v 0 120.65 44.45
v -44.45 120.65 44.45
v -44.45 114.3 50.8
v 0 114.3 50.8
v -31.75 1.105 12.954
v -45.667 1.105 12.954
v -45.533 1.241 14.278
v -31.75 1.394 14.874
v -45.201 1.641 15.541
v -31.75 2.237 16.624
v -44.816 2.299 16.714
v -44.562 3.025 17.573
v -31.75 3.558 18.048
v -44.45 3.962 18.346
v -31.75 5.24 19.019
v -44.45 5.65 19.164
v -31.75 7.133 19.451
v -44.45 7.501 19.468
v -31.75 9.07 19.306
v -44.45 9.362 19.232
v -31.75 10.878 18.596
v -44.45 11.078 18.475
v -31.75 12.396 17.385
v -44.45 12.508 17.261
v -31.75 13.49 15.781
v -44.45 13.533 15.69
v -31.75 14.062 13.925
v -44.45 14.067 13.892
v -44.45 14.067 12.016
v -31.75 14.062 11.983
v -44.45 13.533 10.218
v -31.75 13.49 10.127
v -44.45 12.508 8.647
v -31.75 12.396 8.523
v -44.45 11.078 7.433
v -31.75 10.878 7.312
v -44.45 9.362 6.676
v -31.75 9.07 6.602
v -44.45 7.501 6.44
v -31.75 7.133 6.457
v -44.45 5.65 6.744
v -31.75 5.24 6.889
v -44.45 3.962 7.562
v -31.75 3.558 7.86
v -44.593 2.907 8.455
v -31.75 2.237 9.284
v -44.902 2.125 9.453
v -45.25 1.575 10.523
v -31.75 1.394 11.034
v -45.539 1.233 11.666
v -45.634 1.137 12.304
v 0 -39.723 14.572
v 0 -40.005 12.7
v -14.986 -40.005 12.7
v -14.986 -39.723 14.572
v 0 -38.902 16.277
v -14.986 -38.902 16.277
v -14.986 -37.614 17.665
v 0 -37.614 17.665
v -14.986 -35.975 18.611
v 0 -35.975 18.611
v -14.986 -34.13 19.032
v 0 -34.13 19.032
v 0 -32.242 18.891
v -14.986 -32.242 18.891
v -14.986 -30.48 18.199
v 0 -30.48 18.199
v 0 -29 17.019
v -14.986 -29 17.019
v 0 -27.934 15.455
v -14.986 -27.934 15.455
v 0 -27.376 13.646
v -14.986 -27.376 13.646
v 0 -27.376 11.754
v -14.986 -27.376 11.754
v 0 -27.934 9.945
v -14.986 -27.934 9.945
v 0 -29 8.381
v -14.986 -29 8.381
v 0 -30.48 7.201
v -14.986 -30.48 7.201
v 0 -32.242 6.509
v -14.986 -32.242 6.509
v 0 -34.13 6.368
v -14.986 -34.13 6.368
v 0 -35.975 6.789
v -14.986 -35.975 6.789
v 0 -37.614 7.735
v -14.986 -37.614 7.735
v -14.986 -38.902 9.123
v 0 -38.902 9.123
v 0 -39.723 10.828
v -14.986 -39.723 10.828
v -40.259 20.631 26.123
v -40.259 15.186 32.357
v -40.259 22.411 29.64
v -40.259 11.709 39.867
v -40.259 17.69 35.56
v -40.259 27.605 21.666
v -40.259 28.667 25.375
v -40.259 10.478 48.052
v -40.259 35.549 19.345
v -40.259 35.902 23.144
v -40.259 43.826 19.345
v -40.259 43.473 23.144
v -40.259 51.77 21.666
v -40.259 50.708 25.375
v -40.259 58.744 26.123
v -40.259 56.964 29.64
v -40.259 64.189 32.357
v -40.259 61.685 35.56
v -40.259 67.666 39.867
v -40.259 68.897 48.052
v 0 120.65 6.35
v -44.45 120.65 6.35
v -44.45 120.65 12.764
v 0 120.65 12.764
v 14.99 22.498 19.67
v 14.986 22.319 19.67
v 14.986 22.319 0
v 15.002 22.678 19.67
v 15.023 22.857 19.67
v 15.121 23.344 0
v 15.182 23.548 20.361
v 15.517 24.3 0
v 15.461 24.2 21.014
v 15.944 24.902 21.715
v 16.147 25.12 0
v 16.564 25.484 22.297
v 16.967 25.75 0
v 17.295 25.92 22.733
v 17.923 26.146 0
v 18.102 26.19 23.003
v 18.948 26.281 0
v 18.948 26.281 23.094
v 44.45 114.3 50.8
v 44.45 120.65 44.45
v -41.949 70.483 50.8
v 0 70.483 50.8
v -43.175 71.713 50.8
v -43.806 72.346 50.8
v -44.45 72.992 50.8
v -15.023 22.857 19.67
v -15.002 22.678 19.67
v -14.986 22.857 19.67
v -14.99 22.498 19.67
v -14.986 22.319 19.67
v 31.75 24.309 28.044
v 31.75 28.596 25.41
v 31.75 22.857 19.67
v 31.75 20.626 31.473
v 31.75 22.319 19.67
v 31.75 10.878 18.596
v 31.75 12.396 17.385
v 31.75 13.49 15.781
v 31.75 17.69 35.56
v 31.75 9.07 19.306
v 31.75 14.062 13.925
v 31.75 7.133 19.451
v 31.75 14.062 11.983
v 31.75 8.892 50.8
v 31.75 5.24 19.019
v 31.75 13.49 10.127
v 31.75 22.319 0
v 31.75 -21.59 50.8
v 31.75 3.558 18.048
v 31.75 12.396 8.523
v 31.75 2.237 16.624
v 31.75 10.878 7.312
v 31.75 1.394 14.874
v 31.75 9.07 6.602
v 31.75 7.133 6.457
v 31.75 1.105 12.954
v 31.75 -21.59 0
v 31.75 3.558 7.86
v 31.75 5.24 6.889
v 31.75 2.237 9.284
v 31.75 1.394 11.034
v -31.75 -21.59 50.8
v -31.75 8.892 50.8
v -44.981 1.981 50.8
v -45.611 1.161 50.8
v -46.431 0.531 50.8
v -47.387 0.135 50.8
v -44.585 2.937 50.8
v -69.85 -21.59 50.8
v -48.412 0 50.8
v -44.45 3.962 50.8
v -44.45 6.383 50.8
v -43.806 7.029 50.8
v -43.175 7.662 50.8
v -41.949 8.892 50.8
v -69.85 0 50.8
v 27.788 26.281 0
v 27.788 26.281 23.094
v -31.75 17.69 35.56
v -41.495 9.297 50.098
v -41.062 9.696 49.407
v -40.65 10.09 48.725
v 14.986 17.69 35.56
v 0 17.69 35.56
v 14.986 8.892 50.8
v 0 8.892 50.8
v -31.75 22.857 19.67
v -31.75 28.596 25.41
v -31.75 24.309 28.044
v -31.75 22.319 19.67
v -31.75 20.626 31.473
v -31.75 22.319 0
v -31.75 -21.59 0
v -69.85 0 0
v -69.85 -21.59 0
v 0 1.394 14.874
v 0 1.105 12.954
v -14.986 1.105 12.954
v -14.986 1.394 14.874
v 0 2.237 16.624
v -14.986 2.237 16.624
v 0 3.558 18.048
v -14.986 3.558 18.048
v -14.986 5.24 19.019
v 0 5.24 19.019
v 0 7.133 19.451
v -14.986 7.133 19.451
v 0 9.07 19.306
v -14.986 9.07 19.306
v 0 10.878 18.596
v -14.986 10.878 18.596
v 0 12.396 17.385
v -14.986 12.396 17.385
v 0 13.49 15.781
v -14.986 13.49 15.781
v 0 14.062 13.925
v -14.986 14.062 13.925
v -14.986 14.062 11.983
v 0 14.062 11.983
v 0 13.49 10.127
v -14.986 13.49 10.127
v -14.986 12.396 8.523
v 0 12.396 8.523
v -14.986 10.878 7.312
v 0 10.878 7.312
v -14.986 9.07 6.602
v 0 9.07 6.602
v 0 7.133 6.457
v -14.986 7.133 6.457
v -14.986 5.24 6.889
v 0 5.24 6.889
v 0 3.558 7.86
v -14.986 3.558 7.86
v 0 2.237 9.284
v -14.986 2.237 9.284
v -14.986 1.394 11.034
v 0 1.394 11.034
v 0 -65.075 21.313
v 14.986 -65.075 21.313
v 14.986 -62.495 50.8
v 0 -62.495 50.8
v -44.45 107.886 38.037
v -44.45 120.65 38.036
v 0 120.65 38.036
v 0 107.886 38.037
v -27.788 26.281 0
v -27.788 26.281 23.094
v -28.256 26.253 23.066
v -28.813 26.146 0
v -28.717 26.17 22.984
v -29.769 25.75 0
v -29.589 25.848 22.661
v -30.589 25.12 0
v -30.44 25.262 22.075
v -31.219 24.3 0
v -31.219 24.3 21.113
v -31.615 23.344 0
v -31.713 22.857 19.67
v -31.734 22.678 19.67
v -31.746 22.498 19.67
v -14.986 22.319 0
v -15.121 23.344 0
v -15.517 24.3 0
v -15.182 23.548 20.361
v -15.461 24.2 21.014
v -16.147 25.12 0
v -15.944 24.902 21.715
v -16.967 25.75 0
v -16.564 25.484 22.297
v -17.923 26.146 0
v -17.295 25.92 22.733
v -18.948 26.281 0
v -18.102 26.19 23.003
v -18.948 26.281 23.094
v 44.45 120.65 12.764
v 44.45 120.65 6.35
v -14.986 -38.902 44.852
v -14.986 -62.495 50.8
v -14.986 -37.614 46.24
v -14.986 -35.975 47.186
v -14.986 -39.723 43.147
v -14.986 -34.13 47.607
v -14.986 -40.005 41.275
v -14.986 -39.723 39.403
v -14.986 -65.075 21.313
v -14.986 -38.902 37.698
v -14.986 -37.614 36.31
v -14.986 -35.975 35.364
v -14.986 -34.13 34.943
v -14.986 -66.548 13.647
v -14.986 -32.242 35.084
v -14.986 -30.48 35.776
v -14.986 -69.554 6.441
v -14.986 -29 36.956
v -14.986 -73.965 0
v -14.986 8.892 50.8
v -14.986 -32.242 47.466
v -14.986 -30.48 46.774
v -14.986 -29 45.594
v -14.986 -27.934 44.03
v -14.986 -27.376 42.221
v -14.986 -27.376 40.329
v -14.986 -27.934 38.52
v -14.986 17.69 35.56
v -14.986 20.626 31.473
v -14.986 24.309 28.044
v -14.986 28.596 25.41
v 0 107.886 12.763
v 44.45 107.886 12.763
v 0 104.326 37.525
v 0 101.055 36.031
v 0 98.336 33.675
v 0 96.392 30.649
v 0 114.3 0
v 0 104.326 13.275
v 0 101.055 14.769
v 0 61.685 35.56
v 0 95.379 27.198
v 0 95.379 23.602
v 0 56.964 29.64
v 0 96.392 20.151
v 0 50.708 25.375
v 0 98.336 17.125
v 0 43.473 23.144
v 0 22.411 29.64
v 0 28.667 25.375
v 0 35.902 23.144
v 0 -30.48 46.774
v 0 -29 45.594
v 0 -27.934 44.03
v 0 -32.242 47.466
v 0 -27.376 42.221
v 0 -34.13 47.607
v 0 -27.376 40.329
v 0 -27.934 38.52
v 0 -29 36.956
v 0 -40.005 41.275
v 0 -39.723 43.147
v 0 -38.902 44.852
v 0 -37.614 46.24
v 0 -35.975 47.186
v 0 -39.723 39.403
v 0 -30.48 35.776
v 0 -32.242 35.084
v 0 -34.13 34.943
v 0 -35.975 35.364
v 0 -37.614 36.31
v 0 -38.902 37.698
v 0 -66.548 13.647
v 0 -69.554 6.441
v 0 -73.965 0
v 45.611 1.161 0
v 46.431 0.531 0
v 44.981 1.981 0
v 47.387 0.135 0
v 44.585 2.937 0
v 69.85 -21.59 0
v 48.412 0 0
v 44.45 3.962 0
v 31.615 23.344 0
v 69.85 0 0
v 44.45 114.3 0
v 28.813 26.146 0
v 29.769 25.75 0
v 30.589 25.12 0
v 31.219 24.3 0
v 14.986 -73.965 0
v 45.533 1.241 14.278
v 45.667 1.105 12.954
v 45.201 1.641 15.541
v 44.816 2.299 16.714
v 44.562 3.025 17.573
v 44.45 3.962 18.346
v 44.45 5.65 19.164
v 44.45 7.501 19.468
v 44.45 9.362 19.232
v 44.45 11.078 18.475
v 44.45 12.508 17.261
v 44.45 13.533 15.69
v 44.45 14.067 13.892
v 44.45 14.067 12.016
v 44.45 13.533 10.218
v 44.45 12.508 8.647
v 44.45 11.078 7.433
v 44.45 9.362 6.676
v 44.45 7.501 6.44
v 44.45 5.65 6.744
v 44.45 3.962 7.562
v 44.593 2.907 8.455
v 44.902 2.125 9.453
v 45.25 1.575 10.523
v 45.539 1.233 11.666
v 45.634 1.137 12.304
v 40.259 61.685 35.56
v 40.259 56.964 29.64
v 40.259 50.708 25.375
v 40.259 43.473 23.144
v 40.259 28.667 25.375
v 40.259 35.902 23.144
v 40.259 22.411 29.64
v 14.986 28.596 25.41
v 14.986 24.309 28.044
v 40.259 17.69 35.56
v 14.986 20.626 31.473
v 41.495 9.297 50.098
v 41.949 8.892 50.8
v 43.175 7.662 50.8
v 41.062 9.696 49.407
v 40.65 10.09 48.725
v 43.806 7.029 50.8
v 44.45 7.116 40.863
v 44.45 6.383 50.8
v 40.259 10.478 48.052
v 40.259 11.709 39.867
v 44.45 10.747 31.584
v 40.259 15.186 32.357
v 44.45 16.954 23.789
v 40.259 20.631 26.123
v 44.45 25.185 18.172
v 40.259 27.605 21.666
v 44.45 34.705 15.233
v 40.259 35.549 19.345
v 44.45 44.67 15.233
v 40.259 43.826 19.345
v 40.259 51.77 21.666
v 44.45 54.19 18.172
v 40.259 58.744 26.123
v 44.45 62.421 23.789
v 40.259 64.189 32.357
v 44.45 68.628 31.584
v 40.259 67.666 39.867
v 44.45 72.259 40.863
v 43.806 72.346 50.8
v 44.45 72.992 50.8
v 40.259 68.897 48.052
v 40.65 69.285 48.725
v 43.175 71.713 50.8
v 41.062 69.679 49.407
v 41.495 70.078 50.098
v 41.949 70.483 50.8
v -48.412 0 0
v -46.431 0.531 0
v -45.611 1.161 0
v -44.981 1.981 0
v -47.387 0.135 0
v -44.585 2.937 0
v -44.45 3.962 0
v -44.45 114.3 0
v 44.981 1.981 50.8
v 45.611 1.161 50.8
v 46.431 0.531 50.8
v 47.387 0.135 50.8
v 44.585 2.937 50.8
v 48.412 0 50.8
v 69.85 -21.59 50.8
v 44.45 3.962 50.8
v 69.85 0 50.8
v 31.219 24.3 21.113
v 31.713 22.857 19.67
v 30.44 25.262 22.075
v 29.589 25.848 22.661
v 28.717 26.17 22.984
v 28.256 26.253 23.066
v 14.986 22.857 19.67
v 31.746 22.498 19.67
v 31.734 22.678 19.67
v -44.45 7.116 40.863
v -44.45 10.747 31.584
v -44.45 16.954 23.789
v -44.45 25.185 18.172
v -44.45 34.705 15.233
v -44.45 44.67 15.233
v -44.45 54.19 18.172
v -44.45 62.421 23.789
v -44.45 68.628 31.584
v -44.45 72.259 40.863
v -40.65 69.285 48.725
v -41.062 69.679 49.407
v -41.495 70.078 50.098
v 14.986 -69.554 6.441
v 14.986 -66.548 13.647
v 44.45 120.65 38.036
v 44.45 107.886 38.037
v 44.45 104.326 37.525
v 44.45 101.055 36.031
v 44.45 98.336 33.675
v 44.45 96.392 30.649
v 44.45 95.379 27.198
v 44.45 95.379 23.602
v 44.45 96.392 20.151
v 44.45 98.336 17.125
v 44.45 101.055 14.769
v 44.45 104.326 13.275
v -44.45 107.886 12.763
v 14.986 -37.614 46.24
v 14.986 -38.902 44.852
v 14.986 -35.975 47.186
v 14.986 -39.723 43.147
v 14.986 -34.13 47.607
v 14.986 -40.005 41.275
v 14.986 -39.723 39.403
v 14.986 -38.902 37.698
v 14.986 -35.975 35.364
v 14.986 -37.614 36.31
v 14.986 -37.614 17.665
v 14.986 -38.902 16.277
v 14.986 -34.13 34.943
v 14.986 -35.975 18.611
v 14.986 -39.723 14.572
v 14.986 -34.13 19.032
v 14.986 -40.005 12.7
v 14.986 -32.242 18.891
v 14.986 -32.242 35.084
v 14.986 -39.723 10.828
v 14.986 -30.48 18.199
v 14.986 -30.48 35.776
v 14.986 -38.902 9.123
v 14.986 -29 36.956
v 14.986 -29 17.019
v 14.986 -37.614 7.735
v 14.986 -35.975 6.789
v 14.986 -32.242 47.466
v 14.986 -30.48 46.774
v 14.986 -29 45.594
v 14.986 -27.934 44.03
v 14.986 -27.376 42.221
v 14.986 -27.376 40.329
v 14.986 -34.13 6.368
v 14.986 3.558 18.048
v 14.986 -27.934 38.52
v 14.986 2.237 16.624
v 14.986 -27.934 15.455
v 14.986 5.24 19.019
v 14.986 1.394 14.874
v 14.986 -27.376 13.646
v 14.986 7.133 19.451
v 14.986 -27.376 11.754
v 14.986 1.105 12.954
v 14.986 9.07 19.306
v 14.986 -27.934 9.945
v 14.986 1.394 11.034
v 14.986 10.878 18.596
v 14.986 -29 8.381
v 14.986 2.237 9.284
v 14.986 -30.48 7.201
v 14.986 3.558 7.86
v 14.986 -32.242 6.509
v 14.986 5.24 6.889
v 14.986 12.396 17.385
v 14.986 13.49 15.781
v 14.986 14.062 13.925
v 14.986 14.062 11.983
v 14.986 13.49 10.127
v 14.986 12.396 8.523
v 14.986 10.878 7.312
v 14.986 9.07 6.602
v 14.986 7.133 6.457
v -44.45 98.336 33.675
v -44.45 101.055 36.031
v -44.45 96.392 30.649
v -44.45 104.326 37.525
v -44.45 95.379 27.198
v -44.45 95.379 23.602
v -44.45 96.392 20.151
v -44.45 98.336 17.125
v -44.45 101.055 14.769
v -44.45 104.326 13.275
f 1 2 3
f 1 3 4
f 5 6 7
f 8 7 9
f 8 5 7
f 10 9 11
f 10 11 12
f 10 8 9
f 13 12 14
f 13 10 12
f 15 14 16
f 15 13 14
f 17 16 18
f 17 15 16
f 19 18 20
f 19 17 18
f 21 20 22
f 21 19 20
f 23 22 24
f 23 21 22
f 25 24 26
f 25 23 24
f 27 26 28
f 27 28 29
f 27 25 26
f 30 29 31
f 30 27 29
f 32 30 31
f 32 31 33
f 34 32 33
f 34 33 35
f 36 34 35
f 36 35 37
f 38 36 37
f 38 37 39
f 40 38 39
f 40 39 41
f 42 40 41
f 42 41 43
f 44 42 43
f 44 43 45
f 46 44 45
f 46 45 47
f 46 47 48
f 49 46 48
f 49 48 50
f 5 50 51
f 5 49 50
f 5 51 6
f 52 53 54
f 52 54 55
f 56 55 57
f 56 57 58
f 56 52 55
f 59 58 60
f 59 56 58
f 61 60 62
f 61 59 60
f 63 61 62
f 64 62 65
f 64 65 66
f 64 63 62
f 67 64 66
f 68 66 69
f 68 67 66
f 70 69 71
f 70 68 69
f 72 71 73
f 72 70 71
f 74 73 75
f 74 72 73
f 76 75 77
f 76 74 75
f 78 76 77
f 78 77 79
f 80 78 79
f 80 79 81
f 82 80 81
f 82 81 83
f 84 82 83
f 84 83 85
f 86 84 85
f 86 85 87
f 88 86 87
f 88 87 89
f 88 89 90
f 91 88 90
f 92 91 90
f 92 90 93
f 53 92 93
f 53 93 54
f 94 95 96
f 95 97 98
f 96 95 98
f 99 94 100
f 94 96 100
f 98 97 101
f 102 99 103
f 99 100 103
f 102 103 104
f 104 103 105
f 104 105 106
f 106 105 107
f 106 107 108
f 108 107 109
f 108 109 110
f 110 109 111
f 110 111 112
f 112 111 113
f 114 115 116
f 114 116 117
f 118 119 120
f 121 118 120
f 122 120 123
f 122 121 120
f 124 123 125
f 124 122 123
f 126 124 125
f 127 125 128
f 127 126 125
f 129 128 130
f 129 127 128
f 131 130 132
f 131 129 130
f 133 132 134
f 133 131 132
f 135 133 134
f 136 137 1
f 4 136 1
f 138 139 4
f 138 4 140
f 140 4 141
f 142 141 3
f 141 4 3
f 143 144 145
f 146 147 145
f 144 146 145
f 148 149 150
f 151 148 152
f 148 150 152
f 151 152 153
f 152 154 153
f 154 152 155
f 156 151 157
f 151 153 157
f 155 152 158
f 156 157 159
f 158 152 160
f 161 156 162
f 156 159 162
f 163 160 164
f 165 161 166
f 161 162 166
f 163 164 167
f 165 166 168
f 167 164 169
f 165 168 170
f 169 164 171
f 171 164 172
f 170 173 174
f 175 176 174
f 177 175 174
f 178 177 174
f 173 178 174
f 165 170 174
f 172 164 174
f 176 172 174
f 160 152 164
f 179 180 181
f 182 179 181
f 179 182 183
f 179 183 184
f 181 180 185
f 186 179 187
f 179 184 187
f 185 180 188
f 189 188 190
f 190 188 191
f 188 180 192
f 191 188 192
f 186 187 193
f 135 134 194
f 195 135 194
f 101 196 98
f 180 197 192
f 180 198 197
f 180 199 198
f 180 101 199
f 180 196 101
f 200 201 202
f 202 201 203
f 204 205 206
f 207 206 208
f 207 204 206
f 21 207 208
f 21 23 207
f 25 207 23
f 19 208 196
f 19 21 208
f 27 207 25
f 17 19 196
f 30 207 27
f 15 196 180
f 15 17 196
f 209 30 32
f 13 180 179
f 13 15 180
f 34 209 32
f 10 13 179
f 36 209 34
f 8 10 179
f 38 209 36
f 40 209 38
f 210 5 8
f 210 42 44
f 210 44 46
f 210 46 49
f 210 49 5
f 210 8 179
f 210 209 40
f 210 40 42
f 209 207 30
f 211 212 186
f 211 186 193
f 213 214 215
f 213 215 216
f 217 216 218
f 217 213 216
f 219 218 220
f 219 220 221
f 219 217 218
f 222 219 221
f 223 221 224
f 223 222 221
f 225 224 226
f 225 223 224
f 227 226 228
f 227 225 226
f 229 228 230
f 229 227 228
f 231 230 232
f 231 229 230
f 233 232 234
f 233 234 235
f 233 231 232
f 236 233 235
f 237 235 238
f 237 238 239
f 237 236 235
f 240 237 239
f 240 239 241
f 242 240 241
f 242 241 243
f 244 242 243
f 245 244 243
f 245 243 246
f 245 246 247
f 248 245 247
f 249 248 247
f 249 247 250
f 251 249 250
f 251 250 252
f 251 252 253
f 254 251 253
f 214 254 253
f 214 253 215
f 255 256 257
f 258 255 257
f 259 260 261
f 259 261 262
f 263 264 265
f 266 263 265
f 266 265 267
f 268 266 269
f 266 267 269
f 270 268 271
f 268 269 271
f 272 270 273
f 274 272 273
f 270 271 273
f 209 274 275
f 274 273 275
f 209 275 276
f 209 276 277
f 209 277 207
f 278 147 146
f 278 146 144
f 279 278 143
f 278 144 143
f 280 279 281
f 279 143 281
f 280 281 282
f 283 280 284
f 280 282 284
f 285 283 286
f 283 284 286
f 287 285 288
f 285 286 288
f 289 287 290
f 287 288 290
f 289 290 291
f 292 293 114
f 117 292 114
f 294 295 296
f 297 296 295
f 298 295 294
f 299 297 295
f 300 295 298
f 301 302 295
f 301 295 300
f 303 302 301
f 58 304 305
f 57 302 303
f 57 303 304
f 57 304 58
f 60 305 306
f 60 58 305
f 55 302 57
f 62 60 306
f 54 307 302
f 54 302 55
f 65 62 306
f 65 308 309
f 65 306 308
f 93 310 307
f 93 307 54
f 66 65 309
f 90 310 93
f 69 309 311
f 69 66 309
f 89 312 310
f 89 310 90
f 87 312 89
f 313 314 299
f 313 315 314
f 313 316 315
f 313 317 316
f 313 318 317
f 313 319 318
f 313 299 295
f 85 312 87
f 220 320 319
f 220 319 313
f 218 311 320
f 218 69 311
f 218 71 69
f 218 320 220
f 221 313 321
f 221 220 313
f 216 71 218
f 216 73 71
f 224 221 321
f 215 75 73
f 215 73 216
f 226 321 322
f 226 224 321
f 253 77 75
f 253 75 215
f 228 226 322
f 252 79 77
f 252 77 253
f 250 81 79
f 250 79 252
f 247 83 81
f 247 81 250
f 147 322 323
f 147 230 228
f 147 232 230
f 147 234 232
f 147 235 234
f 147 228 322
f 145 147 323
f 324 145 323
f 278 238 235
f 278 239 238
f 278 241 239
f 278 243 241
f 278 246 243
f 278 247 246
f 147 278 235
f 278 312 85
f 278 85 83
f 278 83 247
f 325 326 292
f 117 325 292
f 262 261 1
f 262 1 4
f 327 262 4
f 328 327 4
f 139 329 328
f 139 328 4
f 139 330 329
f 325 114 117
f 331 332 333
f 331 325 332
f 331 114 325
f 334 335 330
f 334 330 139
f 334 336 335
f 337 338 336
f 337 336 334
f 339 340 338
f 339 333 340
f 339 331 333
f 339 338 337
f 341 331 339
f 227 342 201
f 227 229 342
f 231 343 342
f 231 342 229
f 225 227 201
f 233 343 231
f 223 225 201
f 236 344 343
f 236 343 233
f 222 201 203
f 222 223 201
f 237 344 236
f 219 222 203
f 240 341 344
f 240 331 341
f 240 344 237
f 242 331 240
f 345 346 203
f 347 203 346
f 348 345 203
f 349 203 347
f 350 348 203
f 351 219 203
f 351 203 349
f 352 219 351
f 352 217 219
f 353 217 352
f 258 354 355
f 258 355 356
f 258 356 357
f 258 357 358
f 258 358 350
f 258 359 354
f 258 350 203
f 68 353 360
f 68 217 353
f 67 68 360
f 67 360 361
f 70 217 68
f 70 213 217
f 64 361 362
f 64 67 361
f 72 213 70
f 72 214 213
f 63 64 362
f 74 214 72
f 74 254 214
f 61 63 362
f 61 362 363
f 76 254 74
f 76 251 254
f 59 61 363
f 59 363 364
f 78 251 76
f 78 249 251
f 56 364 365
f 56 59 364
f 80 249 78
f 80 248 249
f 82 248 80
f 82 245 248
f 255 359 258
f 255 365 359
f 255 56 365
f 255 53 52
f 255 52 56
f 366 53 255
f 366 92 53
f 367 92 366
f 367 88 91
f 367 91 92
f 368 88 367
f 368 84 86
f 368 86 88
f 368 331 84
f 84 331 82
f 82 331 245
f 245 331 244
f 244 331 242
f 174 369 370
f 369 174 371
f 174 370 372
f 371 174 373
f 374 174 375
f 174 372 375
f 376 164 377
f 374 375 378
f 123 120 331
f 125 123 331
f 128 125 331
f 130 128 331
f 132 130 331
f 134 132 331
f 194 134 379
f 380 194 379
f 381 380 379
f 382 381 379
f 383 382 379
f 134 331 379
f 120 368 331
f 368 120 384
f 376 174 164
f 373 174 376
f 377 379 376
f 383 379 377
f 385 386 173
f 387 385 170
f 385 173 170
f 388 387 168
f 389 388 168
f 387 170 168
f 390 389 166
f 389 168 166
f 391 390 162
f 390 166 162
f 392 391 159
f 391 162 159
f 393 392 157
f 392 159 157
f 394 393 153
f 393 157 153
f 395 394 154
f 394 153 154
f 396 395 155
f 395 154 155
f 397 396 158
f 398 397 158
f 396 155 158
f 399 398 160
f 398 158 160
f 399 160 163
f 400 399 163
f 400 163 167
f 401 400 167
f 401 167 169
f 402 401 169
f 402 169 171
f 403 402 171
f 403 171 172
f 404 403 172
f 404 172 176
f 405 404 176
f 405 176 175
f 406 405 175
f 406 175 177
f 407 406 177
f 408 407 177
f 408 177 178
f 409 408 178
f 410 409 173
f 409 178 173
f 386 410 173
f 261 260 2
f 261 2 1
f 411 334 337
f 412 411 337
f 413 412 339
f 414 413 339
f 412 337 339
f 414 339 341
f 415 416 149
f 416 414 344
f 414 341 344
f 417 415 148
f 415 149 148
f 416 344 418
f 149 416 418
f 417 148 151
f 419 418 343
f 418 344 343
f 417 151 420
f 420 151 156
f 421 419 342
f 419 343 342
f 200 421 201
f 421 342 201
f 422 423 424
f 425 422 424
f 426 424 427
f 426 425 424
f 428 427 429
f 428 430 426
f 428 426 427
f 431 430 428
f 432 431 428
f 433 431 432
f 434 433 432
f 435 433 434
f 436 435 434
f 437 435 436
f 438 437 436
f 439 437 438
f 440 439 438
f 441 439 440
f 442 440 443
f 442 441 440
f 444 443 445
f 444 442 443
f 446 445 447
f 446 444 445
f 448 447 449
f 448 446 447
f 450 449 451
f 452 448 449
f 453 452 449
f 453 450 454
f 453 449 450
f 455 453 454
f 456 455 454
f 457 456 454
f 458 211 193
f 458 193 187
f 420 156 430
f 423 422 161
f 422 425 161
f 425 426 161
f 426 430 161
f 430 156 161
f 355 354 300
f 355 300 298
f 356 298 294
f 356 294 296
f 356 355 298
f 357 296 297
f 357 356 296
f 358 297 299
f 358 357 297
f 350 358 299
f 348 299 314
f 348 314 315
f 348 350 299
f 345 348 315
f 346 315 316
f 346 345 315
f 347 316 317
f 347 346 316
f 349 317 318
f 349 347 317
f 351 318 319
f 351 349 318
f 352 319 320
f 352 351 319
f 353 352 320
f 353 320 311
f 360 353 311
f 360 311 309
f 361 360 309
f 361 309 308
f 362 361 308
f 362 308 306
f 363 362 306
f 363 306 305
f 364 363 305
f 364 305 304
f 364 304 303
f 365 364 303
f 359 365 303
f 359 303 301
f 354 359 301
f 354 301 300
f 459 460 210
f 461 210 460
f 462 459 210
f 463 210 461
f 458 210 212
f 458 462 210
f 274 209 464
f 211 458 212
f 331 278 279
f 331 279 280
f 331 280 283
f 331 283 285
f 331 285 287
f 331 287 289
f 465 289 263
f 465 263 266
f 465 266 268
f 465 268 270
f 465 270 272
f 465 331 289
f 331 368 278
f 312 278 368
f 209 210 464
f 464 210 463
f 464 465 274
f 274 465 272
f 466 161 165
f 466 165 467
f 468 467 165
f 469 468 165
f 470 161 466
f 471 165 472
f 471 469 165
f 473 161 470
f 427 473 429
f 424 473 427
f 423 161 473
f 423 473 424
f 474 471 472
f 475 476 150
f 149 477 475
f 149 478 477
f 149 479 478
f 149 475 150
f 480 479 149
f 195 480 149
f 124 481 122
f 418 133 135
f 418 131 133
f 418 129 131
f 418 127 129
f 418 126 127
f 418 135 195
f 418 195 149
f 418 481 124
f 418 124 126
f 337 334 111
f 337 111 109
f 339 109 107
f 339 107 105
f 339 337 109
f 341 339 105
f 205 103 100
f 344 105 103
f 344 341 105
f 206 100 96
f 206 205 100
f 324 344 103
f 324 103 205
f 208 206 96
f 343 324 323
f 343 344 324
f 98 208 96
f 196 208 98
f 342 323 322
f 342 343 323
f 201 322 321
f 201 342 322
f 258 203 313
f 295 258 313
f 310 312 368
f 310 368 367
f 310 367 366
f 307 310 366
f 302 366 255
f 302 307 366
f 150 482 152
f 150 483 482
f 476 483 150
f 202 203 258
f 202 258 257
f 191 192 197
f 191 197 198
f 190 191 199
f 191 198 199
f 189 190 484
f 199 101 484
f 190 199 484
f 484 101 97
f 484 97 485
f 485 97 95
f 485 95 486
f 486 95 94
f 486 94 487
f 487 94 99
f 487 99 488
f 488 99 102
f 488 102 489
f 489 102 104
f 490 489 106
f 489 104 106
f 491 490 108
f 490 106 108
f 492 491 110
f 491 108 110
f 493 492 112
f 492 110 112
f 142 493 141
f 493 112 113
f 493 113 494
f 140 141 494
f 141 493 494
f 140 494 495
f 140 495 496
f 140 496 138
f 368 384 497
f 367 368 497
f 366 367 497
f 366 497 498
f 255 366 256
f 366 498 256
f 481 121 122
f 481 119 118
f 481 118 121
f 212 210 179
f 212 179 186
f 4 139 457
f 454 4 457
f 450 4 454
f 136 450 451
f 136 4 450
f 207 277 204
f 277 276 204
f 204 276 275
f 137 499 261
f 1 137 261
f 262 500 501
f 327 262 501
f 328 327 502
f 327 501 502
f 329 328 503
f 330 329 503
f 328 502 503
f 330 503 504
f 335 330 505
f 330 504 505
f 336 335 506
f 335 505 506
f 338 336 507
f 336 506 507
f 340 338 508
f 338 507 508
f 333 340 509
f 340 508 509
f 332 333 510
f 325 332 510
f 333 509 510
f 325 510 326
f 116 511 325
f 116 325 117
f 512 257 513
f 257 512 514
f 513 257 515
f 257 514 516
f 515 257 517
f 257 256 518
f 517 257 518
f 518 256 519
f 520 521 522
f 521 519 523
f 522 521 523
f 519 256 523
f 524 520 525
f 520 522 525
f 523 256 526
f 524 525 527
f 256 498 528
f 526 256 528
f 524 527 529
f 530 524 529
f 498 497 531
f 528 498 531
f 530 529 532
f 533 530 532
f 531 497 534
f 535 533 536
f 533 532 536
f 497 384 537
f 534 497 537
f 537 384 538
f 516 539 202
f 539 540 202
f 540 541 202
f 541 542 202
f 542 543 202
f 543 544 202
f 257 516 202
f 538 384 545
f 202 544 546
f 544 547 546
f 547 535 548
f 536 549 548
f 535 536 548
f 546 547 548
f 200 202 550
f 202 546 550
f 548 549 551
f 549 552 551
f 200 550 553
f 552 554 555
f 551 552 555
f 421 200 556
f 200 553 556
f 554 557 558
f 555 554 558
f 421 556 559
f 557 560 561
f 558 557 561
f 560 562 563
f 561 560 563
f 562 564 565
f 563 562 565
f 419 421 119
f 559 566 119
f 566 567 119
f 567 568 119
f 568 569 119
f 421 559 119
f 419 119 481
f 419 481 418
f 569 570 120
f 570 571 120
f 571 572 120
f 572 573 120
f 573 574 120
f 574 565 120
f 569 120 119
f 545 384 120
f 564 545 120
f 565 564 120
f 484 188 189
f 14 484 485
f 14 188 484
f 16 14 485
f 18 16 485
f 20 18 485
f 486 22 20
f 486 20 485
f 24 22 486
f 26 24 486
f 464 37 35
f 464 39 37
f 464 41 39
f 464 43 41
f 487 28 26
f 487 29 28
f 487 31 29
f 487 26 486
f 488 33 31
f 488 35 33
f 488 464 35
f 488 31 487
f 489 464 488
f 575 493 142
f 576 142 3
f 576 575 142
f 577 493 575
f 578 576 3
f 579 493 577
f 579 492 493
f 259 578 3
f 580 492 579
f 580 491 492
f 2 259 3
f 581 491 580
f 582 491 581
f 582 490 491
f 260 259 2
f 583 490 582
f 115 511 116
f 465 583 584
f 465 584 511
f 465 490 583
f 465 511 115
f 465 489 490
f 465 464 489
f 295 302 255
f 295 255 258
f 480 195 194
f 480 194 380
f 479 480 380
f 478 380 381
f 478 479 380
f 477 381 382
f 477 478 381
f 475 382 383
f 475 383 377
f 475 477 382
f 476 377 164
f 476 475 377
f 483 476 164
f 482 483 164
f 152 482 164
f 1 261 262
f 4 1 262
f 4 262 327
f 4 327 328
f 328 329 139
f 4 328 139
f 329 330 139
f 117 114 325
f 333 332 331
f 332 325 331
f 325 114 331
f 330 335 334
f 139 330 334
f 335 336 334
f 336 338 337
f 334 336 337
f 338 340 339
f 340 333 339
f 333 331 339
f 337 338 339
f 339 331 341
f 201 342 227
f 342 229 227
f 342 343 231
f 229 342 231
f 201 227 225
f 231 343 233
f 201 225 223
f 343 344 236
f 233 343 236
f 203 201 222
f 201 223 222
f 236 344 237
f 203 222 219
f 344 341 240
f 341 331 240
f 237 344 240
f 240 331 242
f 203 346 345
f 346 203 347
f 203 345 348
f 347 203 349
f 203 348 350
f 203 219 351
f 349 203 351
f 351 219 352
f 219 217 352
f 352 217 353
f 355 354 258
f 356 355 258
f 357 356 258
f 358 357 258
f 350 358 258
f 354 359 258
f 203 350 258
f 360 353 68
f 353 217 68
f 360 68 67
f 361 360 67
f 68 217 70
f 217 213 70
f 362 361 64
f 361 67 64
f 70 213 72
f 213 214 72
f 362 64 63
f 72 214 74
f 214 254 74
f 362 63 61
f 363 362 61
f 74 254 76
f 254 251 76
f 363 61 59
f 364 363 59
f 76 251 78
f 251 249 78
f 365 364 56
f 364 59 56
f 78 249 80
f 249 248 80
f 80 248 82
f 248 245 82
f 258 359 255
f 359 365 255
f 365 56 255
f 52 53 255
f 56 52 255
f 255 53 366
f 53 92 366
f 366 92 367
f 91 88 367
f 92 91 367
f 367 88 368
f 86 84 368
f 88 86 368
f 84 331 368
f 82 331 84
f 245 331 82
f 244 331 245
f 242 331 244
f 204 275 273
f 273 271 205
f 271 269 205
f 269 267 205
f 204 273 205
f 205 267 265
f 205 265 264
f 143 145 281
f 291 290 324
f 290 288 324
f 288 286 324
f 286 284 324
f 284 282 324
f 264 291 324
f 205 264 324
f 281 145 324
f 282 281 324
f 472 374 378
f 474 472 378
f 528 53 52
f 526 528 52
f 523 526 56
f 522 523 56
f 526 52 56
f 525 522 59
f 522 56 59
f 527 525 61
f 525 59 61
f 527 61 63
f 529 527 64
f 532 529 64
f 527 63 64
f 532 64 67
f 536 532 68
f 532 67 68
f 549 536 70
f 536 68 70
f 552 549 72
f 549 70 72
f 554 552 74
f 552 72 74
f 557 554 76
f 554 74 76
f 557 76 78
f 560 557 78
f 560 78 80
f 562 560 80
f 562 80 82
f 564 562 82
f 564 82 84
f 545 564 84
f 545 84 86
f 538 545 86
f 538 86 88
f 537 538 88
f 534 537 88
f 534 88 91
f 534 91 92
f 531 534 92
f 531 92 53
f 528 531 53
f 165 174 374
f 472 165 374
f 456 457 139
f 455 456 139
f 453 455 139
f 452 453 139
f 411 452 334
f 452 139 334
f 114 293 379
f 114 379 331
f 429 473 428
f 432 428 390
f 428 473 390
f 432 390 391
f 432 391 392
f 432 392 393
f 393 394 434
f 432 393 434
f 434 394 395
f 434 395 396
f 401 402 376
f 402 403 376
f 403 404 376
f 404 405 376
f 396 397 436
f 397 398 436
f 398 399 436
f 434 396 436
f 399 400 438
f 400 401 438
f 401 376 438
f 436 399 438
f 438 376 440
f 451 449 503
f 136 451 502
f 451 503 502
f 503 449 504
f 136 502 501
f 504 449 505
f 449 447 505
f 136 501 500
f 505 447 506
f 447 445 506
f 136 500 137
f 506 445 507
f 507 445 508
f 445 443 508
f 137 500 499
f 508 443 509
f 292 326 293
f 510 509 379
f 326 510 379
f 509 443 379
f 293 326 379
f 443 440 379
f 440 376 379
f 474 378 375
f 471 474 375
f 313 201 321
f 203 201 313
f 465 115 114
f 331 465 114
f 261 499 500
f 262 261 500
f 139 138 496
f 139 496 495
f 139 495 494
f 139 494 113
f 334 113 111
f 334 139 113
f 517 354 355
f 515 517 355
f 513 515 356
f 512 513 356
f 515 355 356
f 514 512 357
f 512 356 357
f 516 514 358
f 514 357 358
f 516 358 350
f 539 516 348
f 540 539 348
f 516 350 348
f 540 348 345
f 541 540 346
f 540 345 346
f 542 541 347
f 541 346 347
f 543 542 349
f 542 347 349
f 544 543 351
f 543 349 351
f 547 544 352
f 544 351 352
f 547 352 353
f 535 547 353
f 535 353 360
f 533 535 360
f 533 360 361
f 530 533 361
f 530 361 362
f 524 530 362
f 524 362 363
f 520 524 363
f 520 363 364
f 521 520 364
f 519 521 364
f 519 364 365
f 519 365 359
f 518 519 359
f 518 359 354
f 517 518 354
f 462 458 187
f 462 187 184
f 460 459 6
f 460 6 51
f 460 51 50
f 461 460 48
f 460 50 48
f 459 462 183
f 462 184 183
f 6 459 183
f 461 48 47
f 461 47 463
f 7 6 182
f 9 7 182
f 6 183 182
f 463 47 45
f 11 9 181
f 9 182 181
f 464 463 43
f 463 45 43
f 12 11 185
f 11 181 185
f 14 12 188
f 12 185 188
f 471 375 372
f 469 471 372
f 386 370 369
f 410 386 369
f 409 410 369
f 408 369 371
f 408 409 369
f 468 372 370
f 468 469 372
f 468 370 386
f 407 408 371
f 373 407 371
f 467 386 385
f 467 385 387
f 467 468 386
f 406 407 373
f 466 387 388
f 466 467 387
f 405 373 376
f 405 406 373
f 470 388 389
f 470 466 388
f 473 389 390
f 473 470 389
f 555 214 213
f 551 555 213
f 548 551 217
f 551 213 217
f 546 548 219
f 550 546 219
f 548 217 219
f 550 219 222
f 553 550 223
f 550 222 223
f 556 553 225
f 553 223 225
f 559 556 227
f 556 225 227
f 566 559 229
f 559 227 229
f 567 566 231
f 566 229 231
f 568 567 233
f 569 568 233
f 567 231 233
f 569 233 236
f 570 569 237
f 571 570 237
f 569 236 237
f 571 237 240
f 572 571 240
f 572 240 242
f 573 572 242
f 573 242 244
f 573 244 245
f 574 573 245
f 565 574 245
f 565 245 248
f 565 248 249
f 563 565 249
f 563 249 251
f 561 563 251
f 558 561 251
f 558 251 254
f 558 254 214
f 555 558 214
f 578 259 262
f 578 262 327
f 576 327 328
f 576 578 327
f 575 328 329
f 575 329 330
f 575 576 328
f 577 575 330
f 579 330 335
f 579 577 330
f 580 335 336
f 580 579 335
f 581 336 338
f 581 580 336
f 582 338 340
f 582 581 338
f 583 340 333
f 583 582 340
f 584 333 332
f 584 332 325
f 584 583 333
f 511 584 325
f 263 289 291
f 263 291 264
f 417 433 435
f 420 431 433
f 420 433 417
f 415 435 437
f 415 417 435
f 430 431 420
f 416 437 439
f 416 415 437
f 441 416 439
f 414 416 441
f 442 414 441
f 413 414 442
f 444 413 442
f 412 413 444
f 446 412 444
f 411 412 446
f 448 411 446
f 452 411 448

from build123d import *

# Parameters (mm, degrees)
F1_DEPTH  = 50.8
F2_R      = 3.9624
F3_SIZE   = 6.35
F5_DEPTH  = 44.451
F7_D      = 13.0302
F9_DEPTH  = 69.851
F10_R     = 29.21
F11_DEPTH = 29.591
F12_SIZE  = 4.19099
F14_DEPTH = 14.9870001
F16_DEPTH = 16.764
F17_R     = 6.35
F18_DEPTH = 69.851


# Not quite as in the source:
# - a fillet or chamfer is up to 0.001 mm smaller than in the source, because OpenCascade refuses the exact size


with BuildPart() as f1:
    # F0 (on Top) → F1 (new body)
    with BuildSketch(Plane.XY):
        Polygon((44.45, 120.65), (0, 120.65), (0, 0), (0, -21.59), (0, -73.9648), (14.986, -73.9648), (14.986, 26.2809675187), (31.75, 26.2809675187), (31.75, -21.59), (69.85, -21.59), (69.85, 0), (44.45, 0), align=None)
    extrude(amount=F1_DEPTH)

    # F2
    f2_edges = [f1.edges().sort_by_distance(p)[0] for p in [
        (44.45, 0, 25.4),
        (14.986, 26.280968, 25.4),
        (31.75, 26.280968, 25.4),
    ]]
    fillet(f2_edges, radius=F2_R)

    # F3
    f3_edges = [f1.edges().sort_by_distance(p)[0] for p in [
        (22.225, 120.65, 50.8),
        (22.225, 120.65, 0),
    ]]
    chamfer(f3_edges, length=F3_SIZE)

    # F4 (on face) → F5 (cut, through all)
    with BuildSketch(Plane.YZ.offset(44.45)):
        with BuildLine():
            Line((120.65, 38.0365), (107.8865, 38.0365))
            ThreePointArc((107.8865, 38.0365), (95.25, 25.4), (107.8865, 12.7635))
            Line((107.8865, 12.7635), (120.65, 12.7635))
            Line((120.65, 12.7635), (120.65, 38.0365))
        make_face()
    extrude(amount=-F5_DEPTH, mode=Mode.SUBTRACT)

    # F7 (through all)
    with Locations(Plane.YZ.offset(69.85)):
        with Locations((7.62, 12.954)):
            Hole(F7_D / 2)

    # F8 (on face) → F9 (cut, through all)
    with BuildSketch(Plane(origin=(0, 0, 0), x_dir=(0, -1, 0), z_dir=(-1, 0, 0))):
        with BuildLine():
            Line((-8.8916366414, 50.8), (-70.4833633586, 50.8))
            Line((-70.4833633586, 50.8), (-61.6845452561, 35.56))
            ThreePointArc((-61.6845452561, 35.56), (-39.6875, 22.86), (-17.6904547439, 35.56))
            Line((-17.6904547439, 35.56), (-8.8916366414, 50.8))
        make_face()
    extrude(amount=-F9_DEPTH, mode=Mode.SUBTRACT)

    # F10 (on face) → F11 (cut)
    with BuildSketch(Plane.YZ.offset(69.85)):
        with Locations((39.6875, 48.26)):
            Circle(F10_R)
    extrude(amount=-F11_DEPTH, mode=Mode.SUBTRACT)

    # F12 (size 4.191 in the source; OpenCascade refuses exactly that, so slightly less here)
    f12_edges = [f1.edges().sort_by_distance(p)[0] for p in [
        (44.45, 39.6875, 19.05),
    ]]
    chamfer(f12_edges, length=F12_SIZE)

    # F13 (on face) → F14 (cut, through all)
    with BuildSketch(Plane.YZ.offset(14.986)):
        with BuildLine():
            Line((-73.9648, 50.8), (-73.9648, 0))
            ThreePointArc((-73.9648, 0), (-67.8661098873, 9.9669221787), (-65.0748, 21.3133818873))
            Line((-65.0748, 21.3133818873), (-62.4950551894, 50.8))
            Line((-62.4950551894, 50.8), (-73.9648, 50.8))
        make_face()
    extrude(amount=-F14_DEPTH, mode=Mode.SUBTRACT)

    # F15 (on face) → F16 (cut, through all)
    with BuildSketch(Plane.YZ.offset(14.986)):
        Polygon((11.9264439221, 19.6698105436), (22.8565887415, 19.6698105436), (41.9241071546, 38.7373289567), (11.9264439221, 38.7373289567), align=None)
    extrude(amount=F16_DEPTH, mode=Mode.SUBTRACT)

    # F17 (on face) → F18 (cut, through all)
    with BuildSketch(Plane(origin=(0, 0, 0), x_dir=(0, -1, 0), z_dir=(-1, 0, 0))):
        with Locations((33.655, 12.7)):
            Circle(F17_R)
        with Locations((33.655, 41.275)):
            Circle(F17_R)
    extrude(amount=-F18_DEPTH, mode=Mode.SUBTRACT)


with BuildPart() as f19_1:
    # F19: instance of F1
    add(f1.part.mirror(Plane.YZ))


solid = Compound([f1.part, f19_1.part])
